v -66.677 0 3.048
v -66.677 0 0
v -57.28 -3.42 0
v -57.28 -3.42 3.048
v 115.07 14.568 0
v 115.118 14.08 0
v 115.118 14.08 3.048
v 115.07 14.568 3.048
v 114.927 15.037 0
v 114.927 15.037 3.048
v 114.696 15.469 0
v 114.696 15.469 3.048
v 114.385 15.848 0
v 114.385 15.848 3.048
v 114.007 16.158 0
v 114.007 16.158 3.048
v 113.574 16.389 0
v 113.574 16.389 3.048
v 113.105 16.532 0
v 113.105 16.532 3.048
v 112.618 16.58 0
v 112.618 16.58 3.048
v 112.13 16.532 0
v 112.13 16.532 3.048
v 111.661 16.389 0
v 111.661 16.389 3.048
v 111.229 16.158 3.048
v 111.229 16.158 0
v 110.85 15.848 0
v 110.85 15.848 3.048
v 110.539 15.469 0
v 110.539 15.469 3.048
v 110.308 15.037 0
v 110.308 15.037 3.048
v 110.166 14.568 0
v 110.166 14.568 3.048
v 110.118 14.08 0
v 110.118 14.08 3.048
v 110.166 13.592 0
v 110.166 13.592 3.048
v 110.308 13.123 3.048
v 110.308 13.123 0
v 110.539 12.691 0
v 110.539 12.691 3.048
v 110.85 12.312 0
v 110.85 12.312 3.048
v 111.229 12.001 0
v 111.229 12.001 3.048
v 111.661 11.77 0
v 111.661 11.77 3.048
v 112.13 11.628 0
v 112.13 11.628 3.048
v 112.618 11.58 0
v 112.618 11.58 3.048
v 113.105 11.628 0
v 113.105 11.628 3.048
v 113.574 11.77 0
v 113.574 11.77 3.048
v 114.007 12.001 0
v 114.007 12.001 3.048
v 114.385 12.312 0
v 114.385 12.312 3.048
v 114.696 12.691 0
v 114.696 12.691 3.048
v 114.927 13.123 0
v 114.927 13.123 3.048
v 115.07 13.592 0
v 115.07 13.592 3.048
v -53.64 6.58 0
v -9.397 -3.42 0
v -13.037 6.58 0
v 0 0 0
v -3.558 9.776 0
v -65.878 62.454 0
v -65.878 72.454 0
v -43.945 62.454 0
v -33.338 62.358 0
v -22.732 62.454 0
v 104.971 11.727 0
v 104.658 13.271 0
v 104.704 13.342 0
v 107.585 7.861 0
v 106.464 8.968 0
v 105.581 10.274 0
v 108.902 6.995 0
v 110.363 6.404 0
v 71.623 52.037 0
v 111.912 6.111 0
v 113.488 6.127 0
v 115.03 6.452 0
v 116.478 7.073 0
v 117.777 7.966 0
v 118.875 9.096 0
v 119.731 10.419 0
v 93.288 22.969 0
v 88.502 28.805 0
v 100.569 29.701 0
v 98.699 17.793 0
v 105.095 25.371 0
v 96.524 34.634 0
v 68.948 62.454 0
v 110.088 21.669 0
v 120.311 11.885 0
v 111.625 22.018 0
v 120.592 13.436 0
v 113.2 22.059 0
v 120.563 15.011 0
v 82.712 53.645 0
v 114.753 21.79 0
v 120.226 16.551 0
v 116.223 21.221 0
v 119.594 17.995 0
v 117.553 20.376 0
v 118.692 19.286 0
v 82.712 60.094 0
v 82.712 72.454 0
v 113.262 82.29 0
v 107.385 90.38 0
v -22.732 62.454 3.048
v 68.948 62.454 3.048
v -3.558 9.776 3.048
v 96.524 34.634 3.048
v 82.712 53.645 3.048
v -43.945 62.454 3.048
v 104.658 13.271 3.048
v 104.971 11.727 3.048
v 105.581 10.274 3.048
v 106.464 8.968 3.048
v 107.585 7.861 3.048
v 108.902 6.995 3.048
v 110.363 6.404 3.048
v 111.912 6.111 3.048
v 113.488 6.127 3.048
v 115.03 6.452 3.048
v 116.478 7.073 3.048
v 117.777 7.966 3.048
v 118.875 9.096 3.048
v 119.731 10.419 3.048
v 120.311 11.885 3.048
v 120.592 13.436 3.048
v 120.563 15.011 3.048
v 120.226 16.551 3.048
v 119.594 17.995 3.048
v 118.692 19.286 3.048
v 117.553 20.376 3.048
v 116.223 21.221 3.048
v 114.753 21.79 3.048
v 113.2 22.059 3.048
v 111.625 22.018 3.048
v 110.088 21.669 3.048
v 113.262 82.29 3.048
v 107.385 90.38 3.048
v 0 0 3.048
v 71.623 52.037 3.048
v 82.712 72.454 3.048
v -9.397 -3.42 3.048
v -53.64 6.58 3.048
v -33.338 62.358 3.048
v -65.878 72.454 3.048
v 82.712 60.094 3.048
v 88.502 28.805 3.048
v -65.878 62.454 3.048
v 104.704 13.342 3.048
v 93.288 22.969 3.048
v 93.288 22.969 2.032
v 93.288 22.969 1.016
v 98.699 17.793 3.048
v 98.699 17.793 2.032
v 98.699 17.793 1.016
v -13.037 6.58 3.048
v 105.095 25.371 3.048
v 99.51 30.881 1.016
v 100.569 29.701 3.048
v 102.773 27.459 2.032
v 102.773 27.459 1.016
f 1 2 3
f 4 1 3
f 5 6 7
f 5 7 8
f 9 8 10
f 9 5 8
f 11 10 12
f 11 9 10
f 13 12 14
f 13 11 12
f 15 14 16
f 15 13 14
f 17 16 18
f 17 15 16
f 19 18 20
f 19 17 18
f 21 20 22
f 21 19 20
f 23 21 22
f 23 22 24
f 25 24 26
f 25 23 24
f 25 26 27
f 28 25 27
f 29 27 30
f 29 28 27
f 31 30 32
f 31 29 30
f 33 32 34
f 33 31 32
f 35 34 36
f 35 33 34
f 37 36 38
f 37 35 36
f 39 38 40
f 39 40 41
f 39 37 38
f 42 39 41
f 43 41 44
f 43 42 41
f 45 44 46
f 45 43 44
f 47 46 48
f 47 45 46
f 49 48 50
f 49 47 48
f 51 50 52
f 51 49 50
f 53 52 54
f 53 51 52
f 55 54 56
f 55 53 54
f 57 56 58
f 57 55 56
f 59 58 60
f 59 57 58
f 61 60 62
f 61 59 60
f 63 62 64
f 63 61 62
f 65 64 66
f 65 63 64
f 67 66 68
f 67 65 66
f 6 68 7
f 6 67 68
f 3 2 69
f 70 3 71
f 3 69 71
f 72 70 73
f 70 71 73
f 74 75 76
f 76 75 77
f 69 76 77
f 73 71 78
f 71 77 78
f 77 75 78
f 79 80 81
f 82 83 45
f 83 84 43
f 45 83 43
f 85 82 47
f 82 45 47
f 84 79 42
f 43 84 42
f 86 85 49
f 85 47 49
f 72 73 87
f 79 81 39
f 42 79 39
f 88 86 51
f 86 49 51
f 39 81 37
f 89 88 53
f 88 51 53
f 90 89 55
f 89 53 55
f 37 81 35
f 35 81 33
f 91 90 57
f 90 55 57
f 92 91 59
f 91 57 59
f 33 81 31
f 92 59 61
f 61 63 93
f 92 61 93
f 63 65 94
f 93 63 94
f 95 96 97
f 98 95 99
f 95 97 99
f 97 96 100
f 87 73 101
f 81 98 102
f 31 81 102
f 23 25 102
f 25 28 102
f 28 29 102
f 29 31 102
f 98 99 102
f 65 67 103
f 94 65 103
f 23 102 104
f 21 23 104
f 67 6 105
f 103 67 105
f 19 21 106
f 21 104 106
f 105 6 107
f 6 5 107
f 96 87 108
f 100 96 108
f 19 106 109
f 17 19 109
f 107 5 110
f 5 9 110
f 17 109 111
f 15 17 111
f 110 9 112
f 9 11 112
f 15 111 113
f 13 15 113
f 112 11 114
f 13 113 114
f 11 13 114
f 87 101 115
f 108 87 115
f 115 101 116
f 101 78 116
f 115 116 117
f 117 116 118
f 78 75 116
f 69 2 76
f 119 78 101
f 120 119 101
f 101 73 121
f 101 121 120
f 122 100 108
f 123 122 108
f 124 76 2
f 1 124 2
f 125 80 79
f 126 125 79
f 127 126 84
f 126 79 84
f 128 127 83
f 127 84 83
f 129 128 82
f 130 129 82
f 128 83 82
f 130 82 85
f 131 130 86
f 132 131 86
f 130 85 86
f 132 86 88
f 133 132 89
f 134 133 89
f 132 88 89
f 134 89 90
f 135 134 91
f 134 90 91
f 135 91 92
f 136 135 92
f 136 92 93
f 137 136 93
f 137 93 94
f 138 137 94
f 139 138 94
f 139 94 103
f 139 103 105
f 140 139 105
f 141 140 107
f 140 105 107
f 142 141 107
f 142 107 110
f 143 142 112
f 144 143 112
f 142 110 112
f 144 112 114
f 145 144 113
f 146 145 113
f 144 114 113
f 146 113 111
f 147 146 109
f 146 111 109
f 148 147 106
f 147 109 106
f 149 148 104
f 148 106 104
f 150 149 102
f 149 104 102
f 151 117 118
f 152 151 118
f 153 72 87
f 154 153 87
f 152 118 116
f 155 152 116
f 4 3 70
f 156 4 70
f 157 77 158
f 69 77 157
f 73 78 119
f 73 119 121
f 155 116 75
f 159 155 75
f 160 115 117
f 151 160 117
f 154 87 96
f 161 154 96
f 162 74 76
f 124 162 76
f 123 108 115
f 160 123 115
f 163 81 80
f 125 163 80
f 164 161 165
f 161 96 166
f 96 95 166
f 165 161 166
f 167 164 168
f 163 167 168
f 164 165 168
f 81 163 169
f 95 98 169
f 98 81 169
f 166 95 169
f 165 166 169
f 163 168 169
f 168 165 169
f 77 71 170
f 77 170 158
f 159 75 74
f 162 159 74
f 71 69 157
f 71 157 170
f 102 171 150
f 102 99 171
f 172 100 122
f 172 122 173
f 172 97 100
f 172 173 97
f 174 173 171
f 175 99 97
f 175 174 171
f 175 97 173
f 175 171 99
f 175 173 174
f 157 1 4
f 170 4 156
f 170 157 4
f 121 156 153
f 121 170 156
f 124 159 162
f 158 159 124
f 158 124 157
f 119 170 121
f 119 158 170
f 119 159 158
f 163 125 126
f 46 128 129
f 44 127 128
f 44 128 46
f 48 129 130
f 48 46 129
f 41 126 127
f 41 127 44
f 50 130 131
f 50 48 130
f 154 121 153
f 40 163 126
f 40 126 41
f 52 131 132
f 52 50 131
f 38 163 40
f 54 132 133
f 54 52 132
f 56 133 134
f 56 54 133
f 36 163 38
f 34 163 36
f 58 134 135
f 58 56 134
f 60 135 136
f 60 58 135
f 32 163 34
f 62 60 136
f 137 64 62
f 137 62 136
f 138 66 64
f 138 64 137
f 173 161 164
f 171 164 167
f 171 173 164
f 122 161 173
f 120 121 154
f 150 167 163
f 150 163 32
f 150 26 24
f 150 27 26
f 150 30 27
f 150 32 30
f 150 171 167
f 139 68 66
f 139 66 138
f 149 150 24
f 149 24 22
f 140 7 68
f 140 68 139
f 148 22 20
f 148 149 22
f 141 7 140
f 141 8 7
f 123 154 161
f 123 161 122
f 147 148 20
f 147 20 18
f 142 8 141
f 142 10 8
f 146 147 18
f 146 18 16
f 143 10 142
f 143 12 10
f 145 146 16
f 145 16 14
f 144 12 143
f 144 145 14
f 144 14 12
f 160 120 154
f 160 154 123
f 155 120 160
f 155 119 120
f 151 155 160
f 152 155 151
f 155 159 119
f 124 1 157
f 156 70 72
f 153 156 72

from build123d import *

# Parameters (mm, degrees)
SKETCH1_R           = 2.5
BOSS_EXTRUDE1_DEPTH = 3.048


with BuildPart() as part:
    # Sketch1 → Boss-Extrude1 (new body)
    with BuildSketch(Plane.XY):
        with BuildLine():
            Line((0, 0), (71.622808257, 52.037016174))
            Line((71.622808257, 52.037016174), (88.501669832, 28.805256264))
            add(Edge.make_bspline(
                [(88.501669832, 28.805256264), (92.966978859, 22.659285651), (98.410551954, 17.410609678), (104.704030367, 13.341863973)],
                knots=[0.5, 0.5, 0.5, 0.5, 0.915853648, 0.915853648, 0.915853648, 0.915853648], degree=3))
            Line((104.704030367, 13.341863973), (104.658496812, 13.271443843))
            ThreePointArc((104.658496812, 13.271443843), (119.335898328, 9.736398283), (110.087731709, 21.669297201))
            add(Edge.make_bspline(
                [(96.52401812, 34.63383347), (97.463660016, 33.340527353), (99.467318776, 30.820691276), (103.81543362, 26.262690934), (107.476268967, 23.357612806), (110.087731709, 21.669297201)],
                knots=[0.5, 0.5, 0.5, 0.5, 0.603963412, 0.707926824, 0.915853648, 0.915853648, 0.915853648, 0.915853648], degree=3))
            Line((96.52401812, 34.63383347), (82.711847228, 53.644655768))
            Line((82.711847228, 53.644655768), (82.711847228, 60.093674581))
            Line((82.711847228, 60.093674581), (113.262379212, 82.289935321))
            Line((113.262379212, 82.289935321), (107.38452669, 90.380105265))
            Line((107.38452669, 90.380105265), (82.711847228, 72.454354356))
            Line((82.711847228, 72.454354356), (-5.877852523, 72.454354356))
            Line((-5.877852523, 72.454354356), (-65.877852523, 72.454354356))
            Line((-65.877852523, 72.454354356), (-65.877852523, 62.454354356))
            Line((-65.877852523, 62.454354356), (-43.945146495, 62.454354356))
            Line((-43.945146495, 62.454354356), (-66.676672481, 0))
            Line((-66.676672481, 0), (-57.279746273, -3.420201433))
            Line((-57.279746273, -3.420201433), (-9.396926208, -3.420201433))
            Line((-9.396926208, -3.420201433), (0, 0))
        make_face()
        with Locations((112.61759651, 14.07979857)):
            Circle(SKETCH1_R, mode=Mode.SUBTRACT)
        Polygon((-3.558033622, 9.775617033), (68.948028023, 62.454354356), (-5.877852523, 62.454354356), (-22.731525986, 62.454354356), align=None, mode=Mode.SUBTRACT)
        Polygon((-13.036628551, 6.579798567), (-33.338336241, 62.358282022), (-53.640043931, 6.579798567), align=None, mode=Mode.SUBTRACT)
    extrude(amount=BOSS_EXTRUDE1_DEPTH)


solid = part.part
